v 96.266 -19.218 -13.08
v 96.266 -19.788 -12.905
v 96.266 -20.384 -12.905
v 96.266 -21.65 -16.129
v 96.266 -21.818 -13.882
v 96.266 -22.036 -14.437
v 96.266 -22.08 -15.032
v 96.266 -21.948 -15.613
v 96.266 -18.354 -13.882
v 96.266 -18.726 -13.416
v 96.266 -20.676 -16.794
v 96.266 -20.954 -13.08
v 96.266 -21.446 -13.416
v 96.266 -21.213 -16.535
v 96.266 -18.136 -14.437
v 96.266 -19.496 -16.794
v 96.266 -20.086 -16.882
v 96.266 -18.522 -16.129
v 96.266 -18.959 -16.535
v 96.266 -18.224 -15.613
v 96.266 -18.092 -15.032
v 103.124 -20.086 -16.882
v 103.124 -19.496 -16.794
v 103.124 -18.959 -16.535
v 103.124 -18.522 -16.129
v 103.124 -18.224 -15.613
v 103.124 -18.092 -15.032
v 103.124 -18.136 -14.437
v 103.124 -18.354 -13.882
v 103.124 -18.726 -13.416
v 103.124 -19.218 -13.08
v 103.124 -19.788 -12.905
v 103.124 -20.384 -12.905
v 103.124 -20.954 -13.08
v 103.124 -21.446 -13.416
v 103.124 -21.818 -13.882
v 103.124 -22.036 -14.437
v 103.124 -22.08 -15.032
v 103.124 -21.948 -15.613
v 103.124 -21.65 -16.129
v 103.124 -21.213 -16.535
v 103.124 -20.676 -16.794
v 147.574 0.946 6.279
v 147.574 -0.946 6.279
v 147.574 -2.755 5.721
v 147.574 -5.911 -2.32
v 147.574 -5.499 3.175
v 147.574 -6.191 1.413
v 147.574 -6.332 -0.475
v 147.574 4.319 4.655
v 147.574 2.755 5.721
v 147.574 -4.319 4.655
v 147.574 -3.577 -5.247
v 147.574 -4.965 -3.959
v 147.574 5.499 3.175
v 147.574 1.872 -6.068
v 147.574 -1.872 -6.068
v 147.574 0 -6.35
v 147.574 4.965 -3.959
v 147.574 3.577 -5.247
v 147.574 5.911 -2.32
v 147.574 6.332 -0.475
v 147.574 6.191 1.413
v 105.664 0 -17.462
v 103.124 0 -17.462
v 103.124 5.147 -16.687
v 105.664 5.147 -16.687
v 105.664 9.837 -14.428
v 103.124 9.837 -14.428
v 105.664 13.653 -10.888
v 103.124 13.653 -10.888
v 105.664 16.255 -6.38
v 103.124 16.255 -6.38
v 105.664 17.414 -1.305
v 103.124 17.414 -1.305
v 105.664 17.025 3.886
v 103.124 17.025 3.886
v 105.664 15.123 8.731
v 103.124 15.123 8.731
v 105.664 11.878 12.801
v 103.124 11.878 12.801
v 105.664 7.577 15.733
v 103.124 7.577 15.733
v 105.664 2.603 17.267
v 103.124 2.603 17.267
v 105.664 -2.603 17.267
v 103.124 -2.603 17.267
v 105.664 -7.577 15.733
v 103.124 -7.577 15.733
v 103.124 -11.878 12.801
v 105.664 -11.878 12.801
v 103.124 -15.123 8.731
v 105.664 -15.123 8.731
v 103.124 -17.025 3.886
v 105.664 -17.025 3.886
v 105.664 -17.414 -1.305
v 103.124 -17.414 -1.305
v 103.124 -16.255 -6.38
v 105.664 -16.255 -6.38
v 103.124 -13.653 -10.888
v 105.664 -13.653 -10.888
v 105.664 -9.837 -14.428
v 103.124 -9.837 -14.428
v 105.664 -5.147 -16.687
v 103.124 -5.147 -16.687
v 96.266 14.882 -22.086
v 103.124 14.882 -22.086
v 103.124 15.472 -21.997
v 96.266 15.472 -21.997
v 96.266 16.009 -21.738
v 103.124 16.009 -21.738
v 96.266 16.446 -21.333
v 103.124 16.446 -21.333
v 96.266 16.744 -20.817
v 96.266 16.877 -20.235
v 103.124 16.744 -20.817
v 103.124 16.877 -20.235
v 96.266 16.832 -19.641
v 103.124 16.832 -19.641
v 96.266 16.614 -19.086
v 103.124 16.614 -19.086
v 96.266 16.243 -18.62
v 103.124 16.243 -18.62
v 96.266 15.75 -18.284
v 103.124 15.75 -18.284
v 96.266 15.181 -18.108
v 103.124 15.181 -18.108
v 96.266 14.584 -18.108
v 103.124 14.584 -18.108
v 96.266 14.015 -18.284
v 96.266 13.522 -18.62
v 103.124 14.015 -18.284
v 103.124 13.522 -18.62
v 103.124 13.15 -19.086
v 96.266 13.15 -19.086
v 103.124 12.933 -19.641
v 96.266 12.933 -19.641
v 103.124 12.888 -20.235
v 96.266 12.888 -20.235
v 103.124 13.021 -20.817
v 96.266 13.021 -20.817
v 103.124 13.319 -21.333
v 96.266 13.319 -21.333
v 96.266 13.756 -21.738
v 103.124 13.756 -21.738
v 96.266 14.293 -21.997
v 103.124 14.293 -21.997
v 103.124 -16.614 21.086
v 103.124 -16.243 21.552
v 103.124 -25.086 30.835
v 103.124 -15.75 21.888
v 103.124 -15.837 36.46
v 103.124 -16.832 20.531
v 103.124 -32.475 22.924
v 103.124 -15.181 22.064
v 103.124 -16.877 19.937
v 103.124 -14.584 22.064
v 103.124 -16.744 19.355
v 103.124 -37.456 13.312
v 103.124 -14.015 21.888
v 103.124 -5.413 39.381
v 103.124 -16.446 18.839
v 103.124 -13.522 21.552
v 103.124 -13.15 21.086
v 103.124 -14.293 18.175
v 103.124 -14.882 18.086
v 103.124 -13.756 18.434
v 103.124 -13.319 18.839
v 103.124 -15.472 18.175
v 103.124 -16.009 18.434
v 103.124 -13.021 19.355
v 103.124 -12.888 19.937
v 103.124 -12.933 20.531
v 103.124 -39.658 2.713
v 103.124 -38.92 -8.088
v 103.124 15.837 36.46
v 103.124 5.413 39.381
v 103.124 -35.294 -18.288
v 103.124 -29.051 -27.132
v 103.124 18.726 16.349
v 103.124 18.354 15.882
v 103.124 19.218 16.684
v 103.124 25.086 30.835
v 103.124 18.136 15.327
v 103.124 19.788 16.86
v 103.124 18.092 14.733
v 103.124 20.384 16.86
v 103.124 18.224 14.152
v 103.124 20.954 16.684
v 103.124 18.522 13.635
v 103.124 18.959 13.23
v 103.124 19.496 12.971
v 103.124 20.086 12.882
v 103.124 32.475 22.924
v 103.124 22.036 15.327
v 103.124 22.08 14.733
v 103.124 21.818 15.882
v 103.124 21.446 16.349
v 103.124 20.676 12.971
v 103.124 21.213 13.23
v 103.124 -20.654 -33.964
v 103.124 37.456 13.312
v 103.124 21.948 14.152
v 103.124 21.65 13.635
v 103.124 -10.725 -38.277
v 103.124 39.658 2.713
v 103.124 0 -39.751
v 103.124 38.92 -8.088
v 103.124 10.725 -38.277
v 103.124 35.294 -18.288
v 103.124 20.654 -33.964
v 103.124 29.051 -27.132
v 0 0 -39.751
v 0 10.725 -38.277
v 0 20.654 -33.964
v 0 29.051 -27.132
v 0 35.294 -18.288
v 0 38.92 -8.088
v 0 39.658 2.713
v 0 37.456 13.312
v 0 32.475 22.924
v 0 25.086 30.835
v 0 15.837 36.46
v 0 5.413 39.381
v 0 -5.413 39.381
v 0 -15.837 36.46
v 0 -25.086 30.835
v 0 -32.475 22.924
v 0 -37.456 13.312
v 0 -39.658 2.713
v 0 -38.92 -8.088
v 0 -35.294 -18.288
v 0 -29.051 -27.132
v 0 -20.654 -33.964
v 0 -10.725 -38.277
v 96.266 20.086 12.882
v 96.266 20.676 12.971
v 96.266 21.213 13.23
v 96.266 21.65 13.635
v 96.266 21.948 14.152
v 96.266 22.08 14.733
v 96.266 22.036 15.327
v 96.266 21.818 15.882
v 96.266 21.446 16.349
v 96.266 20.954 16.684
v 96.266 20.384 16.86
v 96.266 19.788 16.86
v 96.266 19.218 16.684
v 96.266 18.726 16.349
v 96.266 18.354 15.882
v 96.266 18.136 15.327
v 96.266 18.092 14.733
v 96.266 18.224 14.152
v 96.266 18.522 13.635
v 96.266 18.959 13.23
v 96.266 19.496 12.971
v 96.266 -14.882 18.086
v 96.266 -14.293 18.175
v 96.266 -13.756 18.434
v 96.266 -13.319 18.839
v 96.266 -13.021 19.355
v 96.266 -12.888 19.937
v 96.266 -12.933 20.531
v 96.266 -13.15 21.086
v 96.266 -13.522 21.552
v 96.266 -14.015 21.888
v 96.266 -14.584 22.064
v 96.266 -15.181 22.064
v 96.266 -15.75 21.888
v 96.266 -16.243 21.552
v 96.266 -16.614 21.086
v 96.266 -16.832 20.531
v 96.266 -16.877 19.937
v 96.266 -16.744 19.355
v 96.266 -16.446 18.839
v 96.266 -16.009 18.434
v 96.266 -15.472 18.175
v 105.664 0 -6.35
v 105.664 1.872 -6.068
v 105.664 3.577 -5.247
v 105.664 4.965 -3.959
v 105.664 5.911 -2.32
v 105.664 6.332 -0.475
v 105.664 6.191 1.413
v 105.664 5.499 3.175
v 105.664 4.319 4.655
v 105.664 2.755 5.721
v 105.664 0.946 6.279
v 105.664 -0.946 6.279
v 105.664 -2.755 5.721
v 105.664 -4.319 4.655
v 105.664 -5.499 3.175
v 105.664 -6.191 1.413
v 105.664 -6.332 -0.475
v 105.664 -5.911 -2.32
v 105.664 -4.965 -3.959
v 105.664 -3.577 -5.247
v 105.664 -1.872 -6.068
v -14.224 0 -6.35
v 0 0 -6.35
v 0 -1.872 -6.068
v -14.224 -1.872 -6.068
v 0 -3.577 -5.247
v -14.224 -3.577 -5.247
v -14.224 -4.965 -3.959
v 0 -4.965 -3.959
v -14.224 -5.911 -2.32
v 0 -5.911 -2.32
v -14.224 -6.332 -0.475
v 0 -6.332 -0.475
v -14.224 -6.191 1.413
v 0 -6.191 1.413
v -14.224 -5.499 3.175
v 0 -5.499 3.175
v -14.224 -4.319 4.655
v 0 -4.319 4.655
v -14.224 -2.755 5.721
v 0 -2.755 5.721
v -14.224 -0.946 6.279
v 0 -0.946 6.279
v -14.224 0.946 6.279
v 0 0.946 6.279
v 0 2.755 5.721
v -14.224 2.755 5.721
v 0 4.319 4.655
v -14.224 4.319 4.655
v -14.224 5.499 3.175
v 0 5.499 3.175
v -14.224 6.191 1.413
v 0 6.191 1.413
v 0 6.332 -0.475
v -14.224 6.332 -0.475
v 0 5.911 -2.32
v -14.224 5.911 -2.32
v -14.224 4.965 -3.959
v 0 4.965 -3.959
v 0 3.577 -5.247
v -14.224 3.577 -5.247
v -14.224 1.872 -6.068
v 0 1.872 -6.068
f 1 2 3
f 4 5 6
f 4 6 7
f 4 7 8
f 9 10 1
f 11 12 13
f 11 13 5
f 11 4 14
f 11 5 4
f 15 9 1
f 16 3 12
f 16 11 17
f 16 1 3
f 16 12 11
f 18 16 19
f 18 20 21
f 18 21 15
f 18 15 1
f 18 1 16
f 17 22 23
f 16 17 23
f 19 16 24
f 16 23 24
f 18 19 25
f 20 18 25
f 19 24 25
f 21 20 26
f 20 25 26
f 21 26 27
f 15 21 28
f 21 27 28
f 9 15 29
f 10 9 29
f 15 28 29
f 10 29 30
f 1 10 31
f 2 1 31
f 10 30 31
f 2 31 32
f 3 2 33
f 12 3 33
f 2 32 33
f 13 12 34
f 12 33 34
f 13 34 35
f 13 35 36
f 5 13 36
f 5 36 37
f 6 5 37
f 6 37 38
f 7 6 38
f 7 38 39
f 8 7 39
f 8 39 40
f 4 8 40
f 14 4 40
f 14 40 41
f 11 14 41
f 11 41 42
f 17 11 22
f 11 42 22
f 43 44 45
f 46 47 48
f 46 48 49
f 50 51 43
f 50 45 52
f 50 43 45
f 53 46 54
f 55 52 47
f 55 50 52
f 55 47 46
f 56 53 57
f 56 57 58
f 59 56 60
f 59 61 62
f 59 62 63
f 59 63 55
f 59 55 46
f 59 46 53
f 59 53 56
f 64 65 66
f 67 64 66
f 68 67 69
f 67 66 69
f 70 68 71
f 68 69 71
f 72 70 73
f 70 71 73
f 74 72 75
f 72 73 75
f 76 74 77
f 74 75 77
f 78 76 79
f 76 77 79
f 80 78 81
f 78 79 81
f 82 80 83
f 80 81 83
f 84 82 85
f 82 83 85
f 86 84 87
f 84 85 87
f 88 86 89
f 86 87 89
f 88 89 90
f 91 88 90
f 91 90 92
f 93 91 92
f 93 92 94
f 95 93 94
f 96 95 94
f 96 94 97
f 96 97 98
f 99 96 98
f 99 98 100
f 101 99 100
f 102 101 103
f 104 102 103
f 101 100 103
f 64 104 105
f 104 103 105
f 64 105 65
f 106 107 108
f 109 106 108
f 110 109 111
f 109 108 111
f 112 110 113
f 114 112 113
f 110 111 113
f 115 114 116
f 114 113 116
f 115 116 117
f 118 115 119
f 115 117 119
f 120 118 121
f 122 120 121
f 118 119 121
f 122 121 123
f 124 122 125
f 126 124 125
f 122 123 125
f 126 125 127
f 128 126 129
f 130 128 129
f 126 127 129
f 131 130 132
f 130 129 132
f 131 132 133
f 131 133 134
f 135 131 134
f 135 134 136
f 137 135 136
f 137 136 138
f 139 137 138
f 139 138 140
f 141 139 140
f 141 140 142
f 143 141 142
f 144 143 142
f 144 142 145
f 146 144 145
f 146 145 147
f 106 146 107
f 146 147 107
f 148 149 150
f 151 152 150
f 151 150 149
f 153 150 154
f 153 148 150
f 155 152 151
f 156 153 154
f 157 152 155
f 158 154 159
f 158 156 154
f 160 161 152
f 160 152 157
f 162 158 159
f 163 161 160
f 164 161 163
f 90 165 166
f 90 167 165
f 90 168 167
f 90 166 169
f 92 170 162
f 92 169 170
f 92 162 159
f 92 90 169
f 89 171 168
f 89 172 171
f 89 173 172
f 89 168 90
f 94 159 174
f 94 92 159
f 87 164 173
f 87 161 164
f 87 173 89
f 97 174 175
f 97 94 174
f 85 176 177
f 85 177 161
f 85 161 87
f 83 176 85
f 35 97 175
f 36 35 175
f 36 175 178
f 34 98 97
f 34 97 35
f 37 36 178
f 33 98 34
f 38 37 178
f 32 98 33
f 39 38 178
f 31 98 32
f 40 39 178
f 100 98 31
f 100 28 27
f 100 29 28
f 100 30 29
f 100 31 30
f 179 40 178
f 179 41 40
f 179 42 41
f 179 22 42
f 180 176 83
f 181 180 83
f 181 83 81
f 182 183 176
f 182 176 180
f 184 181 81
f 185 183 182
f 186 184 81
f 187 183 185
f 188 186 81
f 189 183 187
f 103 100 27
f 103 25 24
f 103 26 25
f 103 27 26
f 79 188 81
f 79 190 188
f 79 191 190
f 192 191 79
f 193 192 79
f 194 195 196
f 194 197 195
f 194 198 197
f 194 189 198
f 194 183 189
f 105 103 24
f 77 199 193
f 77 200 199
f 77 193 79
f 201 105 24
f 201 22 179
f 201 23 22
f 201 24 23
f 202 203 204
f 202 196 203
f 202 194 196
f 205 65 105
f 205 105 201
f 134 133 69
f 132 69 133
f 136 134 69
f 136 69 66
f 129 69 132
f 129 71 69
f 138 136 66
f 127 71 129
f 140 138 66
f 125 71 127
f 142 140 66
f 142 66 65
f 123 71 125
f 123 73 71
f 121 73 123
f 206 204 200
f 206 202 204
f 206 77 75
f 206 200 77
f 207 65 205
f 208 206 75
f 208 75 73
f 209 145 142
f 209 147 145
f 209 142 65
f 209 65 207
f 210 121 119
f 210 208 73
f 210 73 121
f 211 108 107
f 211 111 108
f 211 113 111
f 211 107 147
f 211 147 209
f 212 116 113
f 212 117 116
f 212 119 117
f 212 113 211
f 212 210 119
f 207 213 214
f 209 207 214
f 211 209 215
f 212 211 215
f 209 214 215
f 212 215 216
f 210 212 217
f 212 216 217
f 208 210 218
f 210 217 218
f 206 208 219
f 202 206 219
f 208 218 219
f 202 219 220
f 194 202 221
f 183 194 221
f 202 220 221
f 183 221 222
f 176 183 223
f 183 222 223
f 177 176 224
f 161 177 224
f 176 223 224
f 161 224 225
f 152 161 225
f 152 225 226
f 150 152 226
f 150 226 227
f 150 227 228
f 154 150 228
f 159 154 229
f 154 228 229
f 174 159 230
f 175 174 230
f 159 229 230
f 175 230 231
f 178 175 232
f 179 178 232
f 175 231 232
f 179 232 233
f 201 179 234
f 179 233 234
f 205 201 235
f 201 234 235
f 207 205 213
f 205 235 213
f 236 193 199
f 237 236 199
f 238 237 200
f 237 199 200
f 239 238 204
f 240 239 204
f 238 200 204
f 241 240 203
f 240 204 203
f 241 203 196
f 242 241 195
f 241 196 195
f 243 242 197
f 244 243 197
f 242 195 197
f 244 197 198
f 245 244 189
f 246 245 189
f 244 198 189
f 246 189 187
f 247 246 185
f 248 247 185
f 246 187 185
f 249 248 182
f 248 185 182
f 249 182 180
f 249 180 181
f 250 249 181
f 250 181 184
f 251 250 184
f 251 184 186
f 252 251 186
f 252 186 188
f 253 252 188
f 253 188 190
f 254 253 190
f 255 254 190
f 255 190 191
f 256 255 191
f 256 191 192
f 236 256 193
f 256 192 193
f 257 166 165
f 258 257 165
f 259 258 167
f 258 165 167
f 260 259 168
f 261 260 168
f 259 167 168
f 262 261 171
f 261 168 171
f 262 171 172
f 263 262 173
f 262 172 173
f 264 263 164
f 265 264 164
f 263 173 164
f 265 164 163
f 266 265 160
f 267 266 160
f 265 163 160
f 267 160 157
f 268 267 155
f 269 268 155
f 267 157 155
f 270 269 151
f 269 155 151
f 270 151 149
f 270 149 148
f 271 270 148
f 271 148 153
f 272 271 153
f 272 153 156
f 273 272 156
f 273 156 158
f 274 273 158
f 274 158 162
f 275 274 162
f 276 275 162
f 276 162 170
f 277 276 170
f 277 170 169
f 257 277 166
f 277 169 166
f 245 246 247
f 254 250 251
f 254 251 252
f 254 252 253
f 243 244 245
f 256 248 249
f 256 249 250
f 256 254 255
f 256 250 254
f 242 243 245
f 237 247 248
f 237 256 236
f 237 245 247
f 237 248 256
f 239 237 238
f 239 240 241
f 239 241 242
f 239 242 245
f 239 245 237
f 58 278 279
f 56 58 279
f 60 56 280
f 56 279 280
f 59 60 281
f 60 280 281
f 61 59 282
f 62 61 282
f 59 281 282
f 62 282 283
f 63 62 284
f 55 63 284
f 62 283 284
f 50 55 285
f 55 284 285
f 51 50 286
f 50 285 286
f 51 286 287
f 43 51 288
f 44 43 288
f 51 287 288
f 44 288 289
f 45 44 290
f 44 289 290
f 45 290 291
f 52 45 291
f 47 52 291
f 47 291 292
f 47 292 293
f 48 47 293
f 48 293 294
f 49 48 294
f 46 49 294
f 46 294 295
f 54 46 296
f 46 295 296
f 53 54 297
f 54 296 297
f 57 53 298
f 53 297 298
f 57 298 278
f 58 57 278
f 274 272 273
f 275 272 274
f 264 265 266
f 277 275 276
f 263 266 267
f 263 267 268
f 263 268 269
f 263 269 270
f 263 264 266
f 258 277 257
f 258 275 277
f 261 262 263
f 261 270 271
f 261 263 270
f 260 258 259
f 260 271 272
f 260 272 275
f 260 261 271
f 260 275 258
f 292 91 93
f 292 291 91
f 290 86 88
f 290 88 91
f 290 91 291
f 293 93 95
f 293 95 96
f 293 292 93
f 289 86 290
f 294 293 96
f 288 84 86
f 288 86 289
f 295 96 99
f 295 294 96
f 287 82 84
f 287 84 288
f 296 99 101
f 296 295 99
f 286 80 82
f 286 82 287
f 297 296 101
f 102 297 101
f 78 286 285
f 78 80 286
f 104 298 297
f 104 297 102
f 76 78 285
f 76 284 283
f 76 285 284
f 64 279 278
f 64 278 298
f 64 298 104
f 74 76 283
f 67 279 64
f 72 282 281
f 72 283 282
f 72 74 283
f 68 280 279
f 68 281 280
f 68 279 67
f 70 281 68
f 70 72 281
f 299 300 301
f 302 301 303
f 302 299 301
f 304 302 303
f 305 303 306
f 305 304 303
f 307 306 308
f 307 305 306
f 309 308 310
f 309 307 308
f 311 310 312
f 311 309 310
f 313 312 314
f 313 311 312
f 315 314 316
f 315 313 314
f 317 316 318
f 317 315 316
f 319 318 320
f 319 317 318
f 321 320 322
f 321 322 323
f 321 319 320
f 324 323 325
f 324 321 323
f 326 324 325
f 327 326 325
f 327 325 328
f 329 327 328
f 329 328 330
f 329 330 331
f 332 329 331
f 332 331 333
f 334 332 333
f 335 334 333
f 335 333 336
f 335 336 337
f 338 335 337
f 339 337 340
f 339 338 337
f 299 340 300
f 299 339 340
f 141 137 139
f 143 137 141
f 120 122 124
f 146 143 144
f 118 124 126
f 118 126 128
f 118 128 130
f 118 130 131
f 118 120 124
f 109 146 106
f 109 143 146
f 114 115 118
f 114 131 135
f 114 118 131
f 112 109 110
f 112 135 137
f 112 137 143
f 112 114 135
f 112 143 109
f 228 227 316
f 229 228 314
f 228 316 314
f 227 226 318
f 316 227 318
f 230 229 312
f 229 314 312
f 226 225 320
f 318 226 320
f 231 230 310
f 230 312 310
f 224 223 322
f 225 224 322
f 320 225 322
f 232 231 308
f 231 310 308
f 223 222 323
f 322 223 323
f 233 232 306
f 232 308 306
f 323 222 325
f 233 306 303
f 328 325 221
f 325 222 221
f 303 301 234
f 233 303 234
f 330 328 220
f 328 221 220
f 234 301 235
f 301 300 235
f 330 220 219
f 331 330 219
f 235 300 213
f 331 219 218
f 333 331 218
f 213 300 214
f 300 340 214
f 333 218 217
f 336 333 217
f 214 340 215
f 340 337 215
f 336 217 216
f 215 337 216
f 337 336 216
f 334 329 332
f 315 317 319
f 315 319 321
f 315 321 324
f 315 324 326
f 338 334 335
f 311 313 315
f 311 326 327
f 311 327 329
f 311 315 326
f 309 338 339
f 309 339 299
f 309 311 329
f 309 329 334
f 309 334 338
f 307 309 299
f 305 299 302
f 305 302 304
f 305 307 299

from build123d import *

# Parameters (mm, degrees)
SKETCH1_R           = 39.751
BOSS_EXTRUDE1_DEPTH = 103.124
SKETCH2_R           = 17.4625
BOSS_EXTRUDE2_DEPTH = 2.54
SKETCH3_R           = 6.35
BOSS_EXTRUDE3_DEPTH = 41.91
BOSS_EXTRUDE4_START = 14.224
SKETCH4_R           = 6.35
BOSS_EXTRUDE4_DEPTH = 14.224
SKETCH5_R           = 1.999996
CUT_EXTRUDE1_DEPTH  = 6.858


with BuildPart() as part:
    # Sketch1 → Boss-Extrude1 (new body)
    with BuildSketch(Plane(origin=(0, 0, 0), x_dir=(0, 0, -1), z_dir=(1, 0, 0))):
        Circle(SKETCH1_R)
    extrude(amount=BOSS_EXTRUDE1_DEPTH)

    # Sketch2 → Boss-Extrude2 (add)
    with BuildSketch(Plane(origin=(103.124, 0, 0), x_dir=(0, 0, -1), z_dir=(1, 0, 0))):
        Circle(SKETCH2_R)
    extrude(amount=BOSS_EXTRUDE2_DEPTH)

    # Sketch3 → Boss-Extrude3 (add)
    with BuildSketch(Plane(origin=(105.664, 0, 0), x_dir=(0, 0, -1), z_dir=(1, 0, 0))):
        Circle(SKETCH3_R)
    extrude(amount=BOSS_EXTRUDE3_DEPTH)

    # Sketch4 → Boss-Extrude4 (add)
    with BuildSketch(Plane.ZY.offset(BOSS_EXTRUDE4_START)):
        with Locations(Location((0, 0, 0), (0, 0, 180))):
            Circle(SKETCH4_R)
    extrude(amount=-BOSS_EXTRUDE4_DEPTH)

    # Sketch5 → Cut-Extrude1 (cut)
    with BuildSketch(Plane(origin=(103.124, 0, 0), x_dir=(0, 0, -1), z_dir=(1, 0, 0))):
        with Locations((-14.882420075, 20.086004442)):
            Circle(SKETCH5_R)
        with Locations((20.086004442, 14.882420075)):
            Circle(SKETCH5_R)
        with Locations((14.882420075, -20.086004442)):
            Circle(SKETCH5_R)
        with Locations((-20.086004442, -14.882420075)):
            Circle(SKETCH5_R)
    extrude(amount=-CUT_EXTRUDE1_DEPTH, mode=Mode.SUBTRACT)


solid = part.part
